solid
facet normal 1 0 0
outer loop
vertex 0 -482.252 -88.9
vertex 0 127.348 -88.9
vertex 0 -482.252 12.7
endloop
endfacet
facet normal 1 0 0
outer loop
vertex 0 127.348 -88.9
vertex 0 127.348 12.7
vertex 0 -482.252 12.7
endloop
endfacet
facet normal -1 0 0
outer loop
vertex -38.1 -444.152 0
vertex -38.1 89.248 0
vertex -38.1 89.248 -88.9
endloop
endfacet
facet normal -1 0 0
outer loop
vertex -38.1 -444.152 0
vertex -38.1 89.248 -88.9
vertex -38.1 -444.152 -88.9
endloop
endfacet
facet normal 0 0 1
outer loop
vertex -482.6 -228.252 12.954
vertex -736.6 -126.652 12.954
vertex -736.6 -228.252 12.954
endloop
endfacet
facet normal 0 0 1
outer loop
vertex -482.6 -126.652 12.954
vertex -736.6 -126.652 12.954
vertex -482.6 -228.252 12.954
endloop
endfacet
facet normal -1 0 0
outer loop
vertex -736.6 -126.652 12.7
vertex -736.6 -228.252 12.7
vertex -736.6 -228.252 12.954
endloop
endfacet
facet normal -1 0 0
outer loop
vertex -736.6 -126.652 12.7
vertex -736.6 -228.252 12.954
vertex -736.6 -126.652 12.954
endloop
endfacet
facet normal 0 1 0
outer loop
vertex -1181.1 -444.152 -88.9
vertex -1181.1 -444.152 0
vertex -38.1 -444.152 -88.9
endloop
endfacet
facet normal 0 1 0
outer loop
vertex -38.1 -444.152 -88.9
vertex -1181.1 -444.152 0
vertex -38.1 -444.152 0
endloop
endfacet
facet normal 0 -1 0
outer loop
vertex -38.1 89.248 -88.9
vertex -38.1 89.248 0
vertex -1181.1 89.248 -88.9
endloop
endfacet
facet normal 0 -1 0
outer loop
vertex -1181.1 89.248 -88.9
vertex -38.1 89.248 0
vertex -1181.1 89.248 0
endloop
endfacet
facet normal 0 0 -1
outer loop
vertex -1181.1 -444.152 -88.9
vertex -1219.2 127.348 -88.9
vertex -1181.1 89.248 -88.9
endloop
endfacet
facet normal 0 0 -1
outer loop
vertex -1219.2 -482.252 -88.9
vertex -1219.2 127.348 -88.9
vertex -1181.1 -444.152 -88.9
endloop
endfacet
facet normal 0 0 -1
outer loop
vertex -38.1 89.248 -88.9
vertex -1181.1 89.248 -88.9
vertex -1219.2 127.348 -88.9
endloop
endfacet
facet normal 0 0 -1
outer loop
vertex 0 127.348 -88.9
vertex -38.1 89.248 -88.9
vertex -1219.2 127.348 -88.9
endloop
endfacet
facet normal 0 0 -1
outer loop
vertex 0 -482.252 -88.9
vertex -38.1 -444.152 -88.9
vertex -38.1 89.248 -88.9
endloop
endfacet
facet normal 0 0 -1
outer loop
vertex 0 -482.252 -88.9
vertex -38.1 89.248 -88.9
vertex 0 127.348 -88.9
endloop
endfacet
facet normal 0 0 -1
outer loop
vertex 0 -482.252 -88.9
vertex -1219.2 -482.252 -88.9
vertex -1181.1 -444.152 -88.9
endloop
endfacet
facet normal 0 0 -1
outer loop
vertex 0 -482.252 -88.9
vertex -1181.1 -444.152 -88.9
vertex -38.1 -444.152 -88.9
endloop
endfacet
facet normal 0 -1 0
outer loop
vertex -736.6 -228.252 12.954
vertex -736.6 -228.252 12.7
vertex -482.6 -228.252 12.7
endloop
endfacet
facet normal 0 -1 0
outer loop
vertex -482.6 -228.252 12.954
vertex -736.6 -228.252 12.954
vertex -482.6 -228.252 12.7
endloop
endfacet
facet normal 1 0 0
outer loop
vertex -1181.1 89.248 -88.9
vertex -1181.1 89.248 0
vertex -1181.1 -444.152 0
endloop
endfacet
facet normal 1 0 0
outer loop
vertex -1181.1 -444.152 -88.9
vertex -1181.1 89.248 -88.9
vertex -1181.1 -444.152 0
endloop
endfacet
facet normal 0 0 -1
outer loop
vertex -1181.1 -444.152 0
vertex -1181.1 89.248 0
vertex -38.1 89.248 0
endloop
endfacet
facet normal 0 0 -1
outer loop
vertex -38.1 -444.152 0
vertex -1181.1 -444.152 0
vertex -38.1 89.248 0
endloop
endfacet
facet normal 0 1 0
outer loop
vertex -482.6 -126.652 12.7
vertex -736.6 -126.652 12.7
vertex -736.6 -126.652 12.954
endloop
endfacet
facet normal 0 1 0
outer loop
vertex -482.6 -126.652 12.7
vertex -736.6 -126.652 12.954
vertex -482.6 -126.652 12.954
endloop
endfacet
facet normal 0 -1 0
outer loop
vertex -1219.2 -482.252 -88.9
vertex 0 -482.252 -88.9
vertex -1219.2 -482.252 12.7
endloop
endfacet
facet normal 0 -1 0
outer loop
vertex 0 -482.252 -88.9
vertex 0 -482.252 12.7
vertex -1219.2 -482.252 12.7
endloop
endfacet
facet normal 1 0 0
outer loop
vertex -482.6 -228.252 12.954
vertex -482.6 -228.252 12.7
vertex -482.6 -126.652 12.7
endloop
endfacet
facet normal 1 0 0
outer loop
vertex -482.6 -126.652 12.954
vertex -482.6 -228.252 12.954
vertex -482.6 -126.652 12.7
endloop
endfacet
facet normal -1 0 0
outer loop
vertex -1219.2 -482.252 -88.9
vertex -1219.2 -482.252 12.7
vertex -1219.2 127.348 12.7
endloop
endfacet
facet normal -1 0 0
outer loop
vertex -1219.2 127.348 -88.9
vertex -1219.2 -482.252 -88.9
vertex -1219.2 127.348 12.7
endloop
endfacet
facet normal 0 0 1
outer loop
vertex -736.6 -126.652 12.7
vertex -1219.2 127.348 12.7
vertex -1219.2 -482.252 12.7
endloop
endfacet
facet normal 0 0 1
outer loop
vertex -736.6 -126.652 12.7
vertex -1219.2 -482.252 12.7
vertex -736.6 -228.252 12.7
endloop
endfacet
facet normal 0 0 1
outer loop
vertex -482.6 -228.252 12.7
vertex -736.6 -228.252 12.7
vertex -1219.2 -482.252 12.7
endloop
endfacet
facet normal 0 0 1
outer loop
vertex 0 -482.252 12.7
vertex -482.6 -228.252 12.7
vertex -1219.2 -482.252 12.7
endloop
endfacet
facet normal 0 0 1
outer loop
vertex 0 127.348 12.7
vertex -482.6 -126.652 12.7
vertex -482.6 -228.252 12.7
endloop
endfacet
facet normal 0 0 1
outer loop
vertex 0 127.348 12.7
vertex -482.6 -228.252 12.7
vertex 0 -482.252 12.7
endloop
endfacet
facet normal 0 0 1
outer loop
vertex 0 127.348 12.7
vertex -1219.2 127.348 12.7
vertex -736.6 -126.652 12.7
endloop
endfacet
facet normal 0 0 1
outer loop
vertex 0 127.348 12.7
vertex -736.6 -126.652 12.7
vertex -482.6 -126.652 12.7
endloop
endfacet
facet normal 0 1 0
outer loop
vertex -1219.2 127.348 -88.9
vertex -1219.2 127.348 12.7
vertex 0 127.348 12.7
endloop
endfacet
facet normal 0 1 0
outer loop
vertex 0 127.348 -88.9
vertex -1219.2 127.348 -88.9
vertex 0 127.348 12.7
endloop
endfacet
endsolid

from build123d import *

# Parameters (mm, degrees)
F0_W     = 1219.2
F0_H     = 609.6
F1_DEPTH = 12.7
F2_W     = 38.1
F2_H     = 533.4
F3_DEPTH = 88.9
F4_W     = 254
F4_H     = 101.6
F5_DEPTH = 0.254


# Not quite as in the source:
# - a length typed as a fraction of an inch, garbled in the dataset ("3 / 203.2 mm" for 3/8 in), is restored


with BuildPart() as f1:
    # F0 (on Top) → F1 (new body)
    with BuildSketch(Plane.XY):
        with Locations((-609.6, -177.4520107999)):
            Rectangle(F0_W, F0_H)
    extrude(amount=F1_DEPTH)

    # F2 (on face) → F3 (join)
    with BuildSketch(Plane(origin=(0, 0, 0), x_dir=(1, 0, 0), z_dir=(0, 0, -1))):
        Polygon((-1181.1, -89.2479892001), (-1219.2, -89.2479892001), (-1219.2, -127.3479892001), (0, -127.3479892001), (0, -89.2479892001), (-38.1, -89.2479892001), (-1167.365193367, -89.2479892001), align=None)
        Polygon((0, 482.2520107999), (-1219.2, 482.2520107999), (-1219.2, 444.1520107999), (-1181.1, 444.1520107999), (-1167.365193367, 444.1520107999), (-38.1, 444.1520107999), (0, 444.1520107999), align=None)
        with Locations((-1200.15, 177.4520107999)):
            Rectangle(F2_W, F2_H)
        with Locations((-19.05, 177.4520107999)):
            Rectangle(F2_W, F2_H)
    extrude(amount=F3_DEPTH)

    # F4 (on face) → F5 (join)
    with BuildSketch(Plane.XY.offset(12.7)):
        with Locations((-609.6, -177.4520107999)):
            Rectangle(F4_W, F4_H)
    extrude(amount=F5_DEPTH)


solid = f1.part
